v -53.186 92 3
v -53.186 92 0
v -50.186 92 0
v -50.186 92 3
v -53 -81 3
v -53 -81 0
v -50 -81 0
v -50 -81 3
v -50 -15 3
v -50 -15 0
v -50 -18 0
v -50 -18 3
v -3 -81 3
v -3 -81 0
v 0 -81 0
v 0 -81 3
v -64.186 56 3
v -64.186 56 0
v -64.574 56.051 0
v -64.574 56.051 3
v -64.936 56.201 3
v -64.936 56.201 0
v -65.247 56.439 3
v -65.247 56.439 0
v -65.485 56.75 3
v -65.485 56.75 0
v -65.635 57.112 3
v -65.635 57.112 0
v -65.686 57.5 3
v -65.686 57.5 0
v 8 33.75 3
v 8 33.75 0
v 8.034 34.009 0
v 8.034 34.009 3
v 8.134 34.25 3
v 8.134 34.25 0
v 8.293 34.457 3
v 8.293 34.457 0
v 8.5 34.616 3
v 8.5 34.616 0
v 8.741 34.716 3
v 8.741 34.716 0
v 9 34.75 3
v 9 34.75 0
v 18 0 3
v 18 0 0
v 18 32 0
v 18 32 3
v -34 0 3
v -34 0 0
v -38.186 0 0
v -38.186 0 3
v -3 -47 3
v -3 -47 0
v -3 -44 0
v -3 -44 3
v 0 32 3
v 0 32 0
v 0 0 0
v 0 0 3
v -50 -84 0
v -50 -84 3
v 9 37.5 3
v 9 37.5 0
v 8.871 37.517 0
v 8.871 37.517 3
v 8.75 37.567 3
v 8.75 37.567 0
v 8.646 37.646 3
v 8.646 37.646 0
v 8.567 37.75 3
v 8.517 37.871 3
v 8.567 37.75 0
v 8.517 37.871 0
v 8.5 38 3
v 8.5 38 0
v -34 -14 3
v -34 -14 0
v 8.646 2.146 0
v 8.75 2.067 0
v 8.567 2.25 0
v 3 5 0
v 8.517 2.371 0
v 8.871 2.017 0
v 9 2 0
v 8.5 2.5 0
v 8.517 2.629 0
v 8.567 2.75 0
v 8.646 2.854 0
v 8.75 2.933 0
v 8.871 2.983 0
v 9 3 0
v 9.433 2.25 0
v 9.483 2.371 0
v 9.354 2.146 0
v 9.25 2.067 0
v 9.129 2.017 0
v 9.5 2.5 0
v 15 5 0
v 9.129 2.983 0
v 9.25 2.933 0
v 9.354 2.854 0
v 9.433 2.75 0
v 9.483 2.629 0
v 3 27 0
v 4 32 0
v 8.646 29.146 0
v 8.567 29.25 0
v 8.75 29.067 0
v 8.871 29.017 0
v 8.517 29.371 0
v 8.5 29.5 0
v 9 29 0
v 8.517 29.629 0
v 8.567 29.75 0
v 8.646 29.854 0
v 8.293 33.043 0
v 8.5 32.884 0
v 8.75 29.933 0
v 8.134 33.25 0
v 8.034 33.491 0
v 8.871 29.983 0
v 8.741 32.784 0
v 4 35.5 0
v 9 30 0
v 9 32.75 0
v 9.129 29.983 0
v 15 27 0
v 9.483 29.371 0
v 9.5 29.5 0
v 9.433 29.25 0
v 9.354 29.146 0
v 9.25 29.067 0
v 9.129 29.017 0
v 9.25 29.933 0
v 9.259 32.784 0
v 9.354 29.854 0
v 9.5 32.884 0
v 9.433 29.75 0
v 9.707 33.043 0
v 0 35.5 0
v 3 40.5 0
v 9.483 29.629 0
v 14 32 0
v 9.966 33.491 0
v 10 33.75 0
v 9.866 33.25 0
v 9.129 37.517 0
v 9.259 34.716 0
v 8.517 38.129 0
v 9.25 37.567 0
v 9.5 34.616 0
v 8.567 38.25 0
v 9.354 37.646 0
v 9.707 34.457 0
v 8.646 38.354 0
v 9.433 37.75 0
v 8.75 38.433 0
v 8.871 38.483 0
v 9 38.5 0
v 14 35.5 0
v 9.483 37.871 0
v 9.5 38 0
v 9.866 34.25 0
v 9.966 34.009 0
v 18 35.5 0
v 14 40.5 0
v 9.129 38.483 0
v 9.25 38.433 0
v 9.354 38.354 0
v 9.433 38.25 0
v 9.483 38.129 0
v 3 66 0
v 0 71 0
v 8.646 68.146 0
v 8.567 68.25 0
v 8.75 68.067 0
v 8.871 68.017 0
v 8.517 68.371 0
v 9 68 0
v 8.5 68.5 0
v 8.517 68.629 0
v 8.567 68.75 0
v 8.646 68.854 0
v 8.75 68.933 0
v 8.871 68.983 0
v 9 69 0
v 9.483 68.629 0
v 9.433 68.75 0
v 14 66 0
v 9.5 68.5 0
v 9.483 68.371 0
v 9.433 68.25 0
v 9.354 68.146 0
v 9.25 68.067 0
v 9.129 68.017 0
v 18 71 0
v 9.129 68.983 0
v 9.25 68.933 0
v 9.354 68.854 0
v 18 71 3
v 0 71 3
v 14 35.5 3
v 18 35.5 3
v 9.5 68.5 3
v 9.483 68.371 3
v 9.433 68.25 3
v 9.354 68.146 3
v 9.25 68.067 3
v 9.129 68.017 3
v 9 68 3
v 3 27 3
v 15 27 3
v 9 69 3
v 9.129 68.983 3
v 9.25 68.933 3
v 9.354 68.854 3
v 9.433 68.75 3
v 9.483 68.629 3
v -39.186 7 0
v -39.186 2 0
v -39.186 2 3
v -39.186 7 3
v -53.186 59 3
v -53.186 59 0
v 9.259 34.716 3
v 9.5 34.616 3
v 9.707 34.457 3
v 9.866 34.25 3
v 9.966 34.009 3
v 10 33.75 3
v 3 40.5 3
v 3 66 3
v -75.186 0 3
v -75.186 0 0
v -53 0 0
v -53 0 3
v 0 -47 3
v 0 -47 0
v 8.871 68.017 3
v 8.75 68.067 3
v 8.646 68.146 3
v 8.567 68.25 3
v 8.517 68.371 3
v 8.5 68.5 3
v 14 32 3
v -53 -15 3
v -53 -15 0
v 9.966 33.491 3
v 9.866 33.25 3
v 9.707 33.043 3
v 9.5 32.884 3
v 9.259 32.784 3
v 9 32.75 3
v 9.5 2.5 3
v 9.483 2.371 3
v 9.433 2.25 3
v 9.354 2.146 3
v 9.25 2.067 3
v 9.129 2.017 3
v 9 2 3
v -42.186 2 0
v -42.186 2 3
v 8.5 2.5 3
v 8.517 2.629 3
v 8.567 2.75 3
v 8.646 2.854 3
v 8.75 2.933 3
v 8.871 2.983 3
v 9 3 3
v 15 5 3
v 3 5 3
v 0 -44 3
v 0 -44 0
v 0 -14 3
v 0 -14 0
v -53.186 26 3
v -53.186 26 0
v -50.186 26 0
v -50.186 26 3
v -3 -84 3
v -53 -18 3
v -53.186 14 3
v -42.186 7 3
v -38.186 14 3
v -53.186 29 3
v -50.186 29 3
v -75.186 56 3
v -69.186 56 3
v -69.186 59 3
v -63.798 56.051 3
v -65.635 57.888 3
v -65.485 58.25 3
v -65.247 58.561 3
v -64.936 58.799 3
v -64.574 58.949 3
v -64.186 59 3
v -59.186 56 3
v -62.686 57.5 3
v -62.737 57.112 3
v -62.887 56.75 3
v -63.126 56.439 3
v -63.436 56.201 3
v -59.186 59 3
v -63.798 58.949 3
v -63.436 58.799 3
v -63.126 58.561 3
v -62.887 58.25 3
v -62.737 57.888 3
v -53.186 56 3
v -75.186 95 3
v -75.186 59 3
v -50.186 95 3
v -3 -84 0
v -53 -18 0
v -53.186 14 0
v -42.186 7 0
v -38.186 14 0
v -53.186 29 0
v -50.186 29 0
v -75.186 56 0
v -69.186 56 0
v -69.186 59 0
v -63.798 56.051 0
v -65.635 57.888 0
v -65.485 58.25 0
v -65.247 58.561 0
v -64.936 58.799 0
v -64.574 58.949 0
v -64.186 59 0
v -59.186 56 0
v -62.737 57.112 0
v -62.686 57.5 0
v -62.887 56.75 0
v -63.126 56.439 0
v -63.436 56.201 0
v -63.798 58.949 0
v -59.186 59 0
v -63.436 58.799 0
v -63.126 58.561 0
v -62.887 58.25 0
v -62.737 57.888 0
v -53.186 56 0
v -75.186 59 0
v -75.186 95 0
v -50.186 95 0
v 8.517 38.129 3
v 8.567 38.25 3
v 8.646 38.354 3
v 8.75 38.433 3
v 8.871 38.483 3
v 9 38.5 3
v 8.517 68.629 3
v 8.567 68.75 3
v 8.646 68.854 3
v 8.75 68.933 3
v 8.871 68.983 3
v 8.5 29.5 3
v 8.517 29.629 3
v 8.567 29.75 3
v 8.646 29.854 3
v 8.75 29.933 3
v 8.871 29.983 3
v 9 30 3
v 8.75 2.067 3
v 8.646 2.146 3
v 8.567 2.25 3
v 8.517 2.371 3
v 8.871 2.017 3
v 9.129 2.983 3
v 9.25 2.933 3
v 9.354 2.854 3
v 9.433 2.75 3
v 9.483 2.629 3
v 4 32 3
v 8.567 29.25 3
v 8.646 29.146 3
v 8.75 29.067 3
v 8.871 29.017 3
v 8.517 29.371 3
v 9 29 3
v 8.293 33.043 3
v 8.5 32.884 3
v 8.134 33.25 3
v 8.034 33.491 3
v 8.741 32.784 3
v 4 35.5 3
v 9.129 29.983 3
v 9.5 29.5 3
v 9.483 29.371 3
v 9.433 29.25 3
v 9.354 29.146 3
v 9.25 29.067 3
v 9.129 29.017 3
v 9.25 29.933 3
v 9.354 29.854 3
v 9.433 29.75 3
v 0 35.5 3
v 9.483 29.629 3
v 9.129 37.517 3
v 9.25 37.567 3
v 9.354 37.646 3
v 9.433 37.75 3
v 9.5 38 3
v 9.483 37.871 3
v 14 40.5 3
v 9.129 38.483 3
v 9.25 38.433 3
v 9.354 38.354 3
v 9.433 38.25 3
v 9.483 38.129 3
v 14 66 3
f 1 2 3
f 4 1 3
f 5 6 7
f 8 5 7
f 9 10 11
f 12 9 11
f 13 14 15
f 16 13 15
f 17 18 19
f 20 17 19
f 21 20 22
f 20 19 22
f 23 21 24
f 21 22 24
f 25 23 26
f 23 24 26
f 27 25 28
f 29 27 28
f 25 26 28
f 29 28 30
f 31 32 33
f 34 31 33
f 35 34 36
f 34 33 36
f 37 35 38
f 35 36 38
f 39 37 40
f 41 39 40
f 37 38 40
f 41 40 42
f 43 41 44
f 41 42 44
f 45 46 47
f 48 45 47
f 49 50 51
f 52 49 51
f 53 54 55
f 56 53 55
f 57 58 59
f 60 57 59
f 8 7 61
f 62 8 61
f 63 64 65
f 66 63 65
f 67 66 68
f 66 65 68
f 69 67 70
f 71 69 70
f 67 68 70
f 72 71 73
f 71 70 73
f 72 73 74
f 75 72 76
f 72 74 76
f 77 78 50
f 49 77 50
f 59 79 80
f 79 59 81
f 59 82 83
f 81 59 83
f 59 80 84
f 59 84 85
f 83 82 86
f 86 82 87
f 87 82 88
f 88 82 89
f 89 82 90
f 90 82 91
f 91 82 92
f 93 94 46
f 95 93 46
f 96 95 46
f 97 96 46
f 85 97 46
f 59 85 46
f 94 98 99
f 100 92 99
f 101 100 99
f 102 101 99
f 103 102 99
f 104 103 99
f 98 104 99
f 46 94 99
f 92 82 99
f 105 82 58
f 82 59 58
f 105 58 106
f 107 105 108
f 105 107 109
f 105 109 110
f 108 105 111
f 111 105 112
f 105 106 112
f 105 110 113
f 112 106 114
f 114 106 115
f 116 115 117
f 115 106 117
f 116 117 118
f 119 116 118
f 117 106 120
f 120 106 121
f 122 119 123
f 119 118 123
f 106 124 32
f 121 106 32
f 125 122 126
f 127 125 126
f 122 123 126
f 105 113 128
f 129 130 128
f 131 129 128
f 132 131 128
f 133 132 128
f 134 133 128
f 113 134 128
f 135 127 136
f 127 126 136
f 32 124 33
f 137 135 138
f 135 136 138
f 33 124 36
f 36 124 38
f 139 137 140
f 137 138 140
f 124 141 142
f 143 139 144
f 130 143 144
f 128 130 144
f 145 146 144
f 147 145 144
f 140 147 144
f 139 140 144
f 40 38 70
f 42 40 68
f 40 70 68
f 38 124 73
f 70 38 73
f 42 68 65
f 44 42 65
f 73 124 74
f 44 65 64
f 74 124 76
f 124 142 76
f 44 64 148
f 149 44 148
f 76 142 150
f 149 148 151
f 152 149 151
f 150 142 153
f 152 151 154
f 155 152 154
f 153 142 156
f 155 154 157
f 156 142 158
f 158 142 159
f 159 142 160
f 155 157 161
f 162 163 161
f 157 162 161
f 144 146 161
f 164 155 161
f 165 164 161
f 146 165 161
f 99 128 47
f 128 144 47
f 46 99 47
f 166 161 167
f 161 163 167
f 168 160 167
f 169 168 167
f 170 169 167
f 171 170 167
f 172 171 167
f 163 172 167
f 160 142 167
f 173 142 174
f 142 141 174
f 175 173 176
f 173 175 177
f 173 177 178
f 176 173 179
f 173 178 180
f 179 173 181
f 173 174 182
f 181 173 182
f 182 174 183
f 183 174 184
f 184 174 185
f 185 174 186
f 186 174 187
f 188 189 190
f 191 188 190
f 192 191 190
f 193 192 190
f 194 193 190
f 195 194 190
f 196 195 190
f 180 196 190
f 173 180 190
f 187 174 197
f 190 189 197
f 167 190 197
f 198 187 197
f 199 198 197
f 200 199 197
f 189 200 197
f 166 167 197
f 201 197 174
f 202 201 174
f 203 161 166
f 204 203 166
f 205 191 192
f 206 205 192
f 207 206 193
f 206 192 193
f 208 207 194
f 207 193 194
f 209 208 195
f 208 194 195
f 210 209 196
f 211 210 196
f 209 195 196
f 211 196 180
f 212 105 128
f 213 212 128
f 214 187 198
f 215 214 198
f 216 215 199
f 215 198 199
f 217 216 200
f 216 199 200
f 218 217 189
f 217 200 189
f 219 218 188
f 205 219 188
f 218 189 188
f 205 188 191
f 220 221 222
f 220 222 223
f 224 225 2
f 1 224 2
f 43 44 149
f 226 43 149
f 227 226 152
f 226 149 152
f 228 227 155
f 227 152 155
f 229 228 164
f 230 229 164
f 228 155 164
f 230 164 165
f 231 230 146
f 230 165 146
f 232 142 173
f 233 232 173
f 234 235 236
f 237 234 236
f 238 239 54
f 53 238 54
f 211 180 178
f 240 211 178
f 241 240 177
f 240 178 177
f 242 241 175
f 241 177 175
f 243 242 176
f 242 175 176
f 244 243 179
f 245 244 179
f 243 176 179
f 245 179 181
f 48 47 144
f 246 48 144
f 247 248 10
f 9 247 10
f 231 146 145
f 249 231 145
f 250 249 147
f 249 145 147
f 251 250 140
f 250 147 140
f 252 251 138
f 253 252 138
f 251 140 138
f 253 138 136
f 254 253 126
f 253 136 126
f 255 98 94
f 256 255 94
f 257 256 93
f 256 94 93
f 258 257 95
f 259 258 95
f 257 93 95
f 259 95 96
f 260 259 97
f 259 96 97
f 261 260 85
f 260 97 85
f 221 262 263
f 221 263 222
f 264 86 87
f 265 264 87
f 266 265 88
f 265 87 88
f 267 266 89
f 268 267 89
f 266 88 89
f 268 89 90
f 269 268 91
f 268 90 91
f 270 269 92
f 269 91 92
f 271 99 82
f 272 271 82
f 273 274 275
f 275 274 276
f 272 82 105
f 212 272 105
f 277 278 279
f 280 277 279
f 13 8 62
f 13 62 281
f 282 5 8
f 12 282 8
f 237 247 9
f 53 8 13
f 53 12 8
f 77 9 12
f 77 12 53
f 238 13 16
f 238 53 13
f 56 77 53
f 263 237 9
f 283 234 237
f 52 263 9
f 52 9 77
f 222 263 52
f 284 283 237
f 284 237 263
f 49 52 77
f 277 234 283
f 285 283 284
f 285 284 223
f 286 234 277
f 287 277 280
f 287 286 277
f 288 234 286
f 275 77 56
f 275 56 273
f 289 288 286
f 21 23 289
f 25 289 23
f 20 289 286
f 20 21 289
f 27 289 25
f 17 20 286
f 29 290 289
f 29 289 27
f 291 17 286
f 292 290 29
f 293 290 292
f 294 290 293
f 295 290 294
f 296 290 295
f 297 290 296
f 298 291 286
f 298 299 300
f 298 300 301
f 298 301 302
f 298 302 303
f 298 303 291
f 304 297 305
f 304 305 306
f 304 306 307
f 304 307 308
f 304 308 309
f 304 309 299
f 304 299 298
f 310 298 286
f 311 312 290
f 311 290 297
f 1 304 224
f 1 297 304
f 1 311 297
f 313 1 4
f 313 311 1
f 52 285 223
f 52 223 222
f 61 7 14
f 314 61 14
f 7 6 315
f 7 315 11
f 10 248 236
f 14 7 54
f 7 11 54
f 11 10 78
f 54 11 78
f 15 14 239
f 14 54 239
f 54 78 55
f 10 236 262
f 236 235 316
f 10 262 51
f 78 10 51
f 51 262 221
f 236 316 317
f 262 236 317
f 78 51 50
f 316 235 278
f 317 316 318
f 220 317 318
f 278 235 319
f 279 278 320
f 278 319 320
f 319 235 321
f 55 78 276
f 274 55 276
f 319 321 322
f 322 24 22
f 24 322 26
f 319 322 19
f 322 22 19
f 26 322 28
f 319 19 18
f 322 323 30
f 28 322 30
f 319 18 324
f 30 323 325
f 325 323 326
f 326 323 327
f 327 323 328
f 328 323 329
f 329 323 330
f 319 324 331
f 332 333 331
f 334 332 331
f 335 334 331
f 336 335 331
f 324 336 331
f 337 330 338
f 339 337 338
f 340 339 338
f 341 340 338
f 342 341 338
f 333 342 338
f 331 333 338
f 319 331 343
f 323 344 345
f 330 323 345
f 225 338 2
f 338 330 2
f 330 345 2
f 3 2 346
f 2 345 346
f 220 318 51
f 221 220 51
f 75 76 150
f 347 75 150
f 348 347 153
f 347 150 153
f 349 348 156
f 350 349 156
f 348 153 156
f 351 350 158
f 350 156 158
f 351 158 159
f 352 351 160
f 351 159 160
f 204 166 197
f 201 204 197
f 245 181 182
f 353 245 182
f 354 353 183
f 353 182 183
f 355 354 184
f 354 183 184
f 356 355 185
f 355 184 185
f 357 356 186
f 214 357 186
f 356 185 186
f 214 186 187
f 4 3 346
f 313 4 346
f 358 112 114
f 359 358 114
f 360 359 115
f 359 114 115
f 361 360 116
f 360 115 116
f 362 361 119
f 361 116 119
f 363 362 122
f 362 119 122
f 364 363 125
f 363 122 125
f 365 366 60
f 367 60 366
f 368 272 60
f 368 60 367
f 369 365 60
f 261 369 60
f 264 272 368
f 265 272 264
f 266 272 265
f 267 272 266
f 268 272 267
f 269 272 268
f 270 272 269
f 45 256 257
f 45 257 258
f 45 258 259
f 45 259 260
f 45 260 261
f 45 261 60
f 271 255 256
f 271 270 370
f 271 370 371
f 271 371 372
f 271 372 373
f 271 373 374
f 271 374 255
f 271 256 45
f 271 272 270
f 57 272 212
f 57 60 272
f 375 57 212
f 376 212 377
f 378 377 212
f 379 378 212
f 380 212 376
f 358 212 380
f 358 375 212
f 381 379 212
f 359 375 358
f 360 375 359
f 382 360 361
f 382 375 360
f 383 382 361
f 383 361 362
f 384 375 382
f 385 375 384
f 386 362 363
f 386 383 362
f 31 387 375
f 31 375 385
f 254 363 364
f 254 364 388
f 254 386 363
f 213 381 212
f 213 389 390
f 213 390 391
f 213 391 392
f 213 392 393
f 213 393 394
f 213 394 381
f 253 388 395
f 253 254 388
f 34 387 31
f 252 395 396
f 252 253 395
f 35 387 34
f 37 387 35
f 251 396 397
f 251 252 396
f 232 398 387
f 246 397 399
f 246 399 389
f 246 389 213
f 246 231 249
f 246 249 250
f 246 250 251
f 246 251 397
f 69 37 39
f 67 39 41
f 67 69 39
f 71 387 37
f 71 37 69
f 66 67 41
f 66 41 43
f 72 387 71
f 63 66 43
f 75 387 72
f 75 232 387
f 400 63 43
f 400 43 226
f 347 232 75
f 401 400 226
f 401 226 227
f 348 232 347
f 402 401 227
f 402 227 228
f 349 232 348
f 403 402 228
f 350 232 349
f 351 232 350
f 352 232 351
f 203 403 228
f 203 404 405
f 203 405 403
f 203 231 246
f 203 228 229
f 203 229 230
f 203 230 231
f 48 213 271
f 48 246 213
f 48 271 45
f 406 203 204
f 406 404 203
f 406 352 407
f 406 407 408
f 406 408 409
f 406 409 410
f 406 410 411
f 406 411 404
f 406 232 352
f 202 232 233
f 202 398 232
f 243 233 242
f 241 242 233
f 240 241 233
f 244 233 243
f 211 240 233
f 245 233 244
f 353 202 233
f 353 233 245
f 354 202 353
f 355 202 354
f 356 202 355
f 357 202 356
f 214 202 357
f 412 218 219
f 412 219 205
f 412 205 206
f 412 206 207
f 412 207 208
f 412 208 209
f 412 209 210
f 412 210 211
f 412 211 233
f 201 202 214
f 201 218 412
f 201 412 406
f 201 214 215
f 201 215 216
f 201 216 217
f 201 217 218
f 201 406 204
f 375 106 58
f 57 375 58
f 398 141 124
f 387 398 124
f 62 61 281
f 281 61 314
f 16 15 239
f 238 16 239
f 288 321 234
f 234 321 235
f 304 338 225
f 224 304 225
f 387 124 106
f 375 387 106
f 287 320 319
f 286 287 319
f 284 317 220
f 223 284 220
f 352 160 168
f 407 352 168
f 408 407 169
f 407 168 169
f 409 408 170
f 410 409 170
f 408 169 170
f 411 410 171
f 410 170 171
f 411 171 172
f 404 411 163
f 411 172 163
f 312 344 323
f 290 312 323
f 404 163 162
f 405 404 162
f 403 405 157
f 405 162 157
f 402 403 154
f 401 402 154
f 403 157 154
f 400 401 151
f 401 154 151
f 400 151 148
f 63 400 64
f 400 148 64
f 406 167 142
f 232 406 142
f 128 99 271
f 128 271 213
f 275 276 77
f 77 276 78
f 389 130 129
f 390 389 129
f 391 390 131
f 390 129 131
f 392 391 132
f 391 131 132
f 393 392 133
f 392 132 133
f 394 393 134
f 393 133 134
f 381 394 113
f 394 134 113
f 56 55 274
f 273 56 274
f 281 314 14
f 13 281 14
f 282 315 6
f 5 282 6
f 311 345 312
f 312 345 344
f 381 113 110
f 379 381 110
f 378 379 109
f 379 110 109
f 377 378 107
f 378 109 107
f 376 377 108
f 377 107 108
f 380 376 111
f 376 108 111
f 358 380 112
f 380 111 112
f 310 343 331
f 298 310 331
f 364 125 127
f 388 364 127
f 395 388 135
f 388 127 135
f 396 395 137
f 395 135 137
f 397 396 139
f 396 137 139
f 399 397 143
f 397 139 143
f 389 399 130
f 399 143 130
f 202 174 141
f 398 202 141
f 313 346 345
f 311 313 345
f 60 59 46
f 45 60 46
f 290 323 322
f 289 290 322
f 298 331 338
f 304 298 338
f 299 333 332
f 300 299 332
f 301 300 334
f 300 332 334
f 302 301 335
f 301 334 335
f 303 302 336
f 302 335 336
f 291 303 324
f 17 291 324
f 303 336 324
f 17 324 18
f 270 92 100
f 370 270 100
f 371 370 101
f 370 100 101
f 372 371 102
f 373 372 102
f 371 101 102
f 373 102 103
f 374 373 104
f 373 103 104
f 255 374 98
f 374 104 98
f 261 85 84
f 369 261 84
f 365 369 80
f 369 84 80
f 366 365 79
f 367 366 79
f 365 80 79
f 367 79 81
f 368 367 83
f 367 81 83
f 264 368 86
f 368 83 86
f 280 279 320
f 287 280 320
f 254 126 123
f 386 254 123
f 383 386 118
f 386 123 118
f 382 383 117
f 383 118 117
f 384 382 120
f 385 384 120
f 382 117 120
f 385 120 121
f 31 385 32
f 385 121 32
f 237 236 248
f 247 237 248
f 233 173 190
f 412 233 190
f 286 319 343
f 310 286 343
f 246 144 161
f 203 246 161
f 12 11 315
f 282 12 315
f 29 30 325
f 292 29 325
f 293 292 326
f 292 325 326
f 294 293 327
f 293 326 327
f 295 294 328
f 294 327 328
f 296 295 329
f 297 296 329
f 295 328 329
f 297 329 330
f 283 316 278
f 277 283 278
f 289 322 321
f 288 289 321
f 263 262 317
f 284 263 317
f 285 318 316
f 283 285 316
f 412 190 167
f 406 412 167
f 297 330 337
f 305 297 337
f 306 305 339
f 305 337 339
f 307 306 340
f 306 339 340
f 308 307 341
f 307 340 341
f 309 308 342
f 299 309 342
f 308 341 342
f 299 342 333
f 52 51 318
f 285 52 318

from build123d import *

# Parameters (mm, degrees)
F0_W     = 3
F0_H     = 22
F0_W_2   = 4
F0_H_2   = 2.5
F0_H_3   = 25.5
F1_DEPTH = 3
F3_DEPTH = 3
F4_W     = 3
F4_H     = 5
F5_DEPTH = 3


with BuildPart() as f1:
    # F0 (on Top) → F1 (new body)
    with BuildSketch(Plane.XY):
        with BuildLine():
            Line((0, 2.5), (0, 0))
            Line((0, 0), (9, 0))
            Line((9, 0), (9, 2))
            ThreePointArc((9, 2), (8.6464466094, 2.1464466094), (8.5, 2.5))
            Line((8.5, 2.5), (0, 2.5))
        make_face()
        with BuildLine():
            Line((0, 5), (0, 2.5))
            Line((0, 2.5), (8.5, 2.5))
            ThreePointArc((8.5, 2.5), (8.6464466094, 2.8535533906), (9, 3))
            Line((9, 3), (9, 5))
            Line((9, 5), (8.0080386251, 5))
            Line((8.0080386251, 5), (4.5, 5))
            Line((4.5, 5), (3, 5))
            Line((3, 5), (2.25, 5))
            Line((2.25, 5), (0, 5))
        make_face()
        with BuildLine():
            Line((9, 2), (9, 0))
            Line((9, 0), (18, 0))
            Line((18, 0), (18, 2.5))
            Line((18, 2.5), (9.5, 2.5))
            ThreePointArc((9.5, 2.5), (9.3535533906, 2.1464466094), (9, 2))
        make_face()
        Polygon((0, 27), (0, 5), (2.25, 5), (3, 5), (3, 27), align=None)
        with BuildLine():
            Line((0, 29.5), (0, 27))
            Line((0, 27), (3, 27))
            Line((3, 27), (9, 27))
            Line((9, 27), (9, 29))
            ThreePointArc((9, 29), (8.6464466094, 29.1464466094), (8.5, 29.5))
            Line((8.5, 29.5), (0, 29.5))
        make_face()
        with BuildLine():
            Line((9, 5), (9, 3))
            ThreePointArc((9, 3), (9.3535533906, 2.8535533906), (9.5, 2.5))
            Line((9.5, 2.5), (18, 2.5))
            Line((18, 2.5), (18, 5))
            Line((18, 5), (15, 5))
            Line((15, 5), (13.5, 5))
            Line((13.5, 5), (9, 5))
        make_face()
        with BuildLine():
            Line((0, 32), (0, 29.5))
            Line((0, 29.5), (8.5, 29.5))
            ThreePointArc((8.5, 29.5), (8.6464466094, 29.8535533906), (9, 30))
            Line((9, 30), (9, 32))
            Line((9, 32), (4, 32))
            Line((4, 32), (0, 32))
        make_face()
        with Locations((16.5, 16)):
            Rectangle(F0_W, F0_H)
        with BuildLine():
            Line((9, 29), (9, 27))
            Line((9, 27), (15, 27))
            Line((15, 27), (18, 27))
            Line((18, 27), (18, 29.5))
            Line((18, 29.5), (9.5, 29.5))
            ThreePointArc((9.5, 29.5), (9.3535533906, 29.1464466094), (9, 29))
        make_face()
        with BuildLine():
            Line((4, 33.75), (4, 32))
            Line((4, 32), (9, 32))
            Line((9, 32), (9, 32.75))
            ThreePointArc((9, 32.75), (8.2928932188, 33.0428932188), (8, 33.75))
            Line((8, 33.75), (4, 33.75))
        make_face()
        with BuildLine():
            Line((9, 32), (9, 30))
            ThreePointArc((9, 30), (9.3535533906, 29.8535533906), (9.5, 29.5))
            Line((9.5, 29.5), (18, 29.5))
            Line((18, 29.5), (18, 32))
            Line((18, 32), (14, 32))
            Line((14, 32), (9, 32))
        make_face()
        with BuildLine():
            Line((9, 32.75), (9, 32))
            Line((9, 32), (14, 32))
            Line((14, 32), (14, 33.75))
            Line((14, 33.75), (10, 33.75))
            ThreePointArc((10, 33.75), (9.7071067812, 33.0428932188), (9, 32.75))
        make_face()
        with BuildLine():
            Line((4, 35.5), (4, 33.75))
            Line((4, 33.75), (8, 33.75))
            ThreePointArc((8, 33.75), (8.2928932188, 34.4571067812), (9, 34.75))
            Line((9, 34.75), (9, 35.5))
            Line((9, 35.5), (4, 35.5))
        make_face()
        with BuildLine():
            Line((4, 38), (4, 35.5))
            Line((4, 35.5), (9, 35.5))
            Line((9, 35.5), (9, 37.5))
            ThreePointArc((9, 37.5), (8.6464466094, 37.6464466094), (8.5, 38))
            Line((8.5, 38), (4, 38))
        make_face()
        with Locations((2, 36.75)):
            Rectangle(F0_W_2, F0_H_2)
        with BuildLine():
            Line((10, 33.75), (14, 33.75))
            Line((14, 33.75), (14, 35.5))
            Line((14, 35.5), (9, 35.5))
            Line((9, 35.5), (9, 34.75))
            ThreePointArc((9, 34.75), (9.7071067812, 34.4571067812), (10, 33.75))
        make_face()
        with BuildLine():
            Line((9, 37.5), (9, 35.5))
            Line((9, 35.5), (14, 35.5))
            Line((14, 35.5), (18, 35.5))
            Line((18, 35.5), (18, 38))
            Line((18, 38), (9.5, 38))
            ThreePointArc((9.5, 38), (9.3535533906, 37.6464466094), (9, 37.5))
        make_face()
        Polygon((0, 38), (4, 38), (4, 40.5), (3, 40.5), (0, 40.5), align=None)
        with BuildLine():
            ThreePointArc((9, 38.5), (9.3535533906, 38.3535533906), (9.5, 38))
            Line((9.5, 38), (18, 38))
            Line((18, 38), (18, 40.5))
            Line((18, 40.5), (14, 40.5))
            Line((14, 40.5), (9, 40.5))
            Line((9, 40.5), (9, 38.5))
        make_face()
        with Locations((1.5, 53.25)):
            Rectangle(F0_W, F0_H_3)
        Polygon((0, 71), (0, 66), (3, 66), (3, 68.5), (3, 71), align=None)
        with Locations((16, 53.25)):
            Rectangle(F0_W_2, F0_H_3)
        Polygon((14, 68.5), (14, 66), (18, 66), (18, 71), (14, 71), align=None)
        with BuildLine():
            Line((3, 71), (3, 68.5))
            Line((3, 68.5), (8.5, 68.5))
            ThreePointArc((8.5, 68.5), (8.6464466094, 68.8535533906), (9, 69))
            Line((9, 69), (9, 71))
            Line((9, 71), (3, 71))
        make_face()
        with BuildLine():
            Line((9.5, 68.5), (14, 68.5))
            Line((14, 68.5), (14, 71))
            Line((14, 71), (9, 71))
            Line((9, 71), (9, 69))
            ThreePointArc((9, 69), (9.3535533906, 68.8535533906), (9.5, 68.5))
        make_face()
        with BuildLine():
            Line((4, 40.5), (4, 38))
            Line((4, 38), (8.5, 38))
            ThreePointArc((8.5, 38), (8.6464466094, 38.3535533906), (9, 38.5))
            Line((9, 38.5), (9, 40.5))
            Line((9, 40.5), (4, 40.5))
        make_face()
        with BuildLine():
            Line((3, 68.5), (3, 66))
            Line((3, 66), (9, 66))
            Line((9, 66), (9, 68))
            ThreePointArc((9, 68), (8.6464466094, 68.1464466094), (8.5, 68.5))
            Line((8.5, 68.5), (3, 68.5))
        make_face()
        with BuildLine():
            Line((9, 66), (14, 66))
            Line((14, 66), (14, 68.5))
            Line((14, 68.5), (9.5, 68.5))
            ThreePointArc((9.5, 68.5), (9.3535533906, 68.1464466094), (9, 68))
            Line((9, 68), (9, 66))
        make_face()
    extrude(amount=F1_DEPTH)


with BuildPart() as f3:
    # F2 (on Top) → F3 (new body)
    with BuildSketch(Plane.XY):
        Polygon((-34, 0), (-53, 0), (-53, -15), (-50, -15), (-50, -18), (-53, -18), (-53, -81), (-50, -81), (-50, -84), (-3, -84), (-3, -81), (0, -81), (0, -47), (-3, -47), (-3, -44), (0, -44), (0, -14), (-34, -14), align=None)
    extrude(amount=F3_DEPTH)

    # F4 (on Top) → F5 (join)
    with BuildSketch(Plane.XY):
        Polygon((-75.1862302423, 56), (-75.1862302423, 0), (-38.1862302423, 0), (-38.1862302423, 14), (-50.1862302423, 14), (-53.1862302423, 14), (-53.1862302423, 26), (-50.1862302423, 26), (-50.1862302423, 29), (-53.1862302423, 29), (-53.1862302423, 56), (-59.1862302423, 56), (-64.1862302423, 56), (-69.1862302423, 56), align=None)
        with Locations((-40.6862302423, 4.5)):
            Rectangle(F4_W, F4_H, mode=Mode.SUBTRACT)
        with BuildLine():
            Line((-69.1862302423, 57.5), (-69.1862302423, 56))
            Line((-69.1862302423, 56), (-64.1862302423, 56))
            ThreePointArc((-64.1862302423, 56), (-65.246890414, 56.4393398282), (-65.6862302423, 57.5))
            Line((-65.6862302423, 57.5), (-69.1862302423, 57.5))
        make_face()
        with BuildLine():
            Line((-69.1862302423, 59), (-69.1862302423, 57.5))
            Line((-69.1862302423, 57.5), (-65.6862302423, 57.5))
            ThreePointArc((-65.6862302423, 57.5), (-65.246890414, 58.5606601718), (-64.1862302423, 59))
            Line((-64.1862302423, 59), (-69.1862302423, 59))
        make_face()
        with BuildLine():
            ThreePointArc((-62.6862302423, 57.5), (-63.1255700705, 56.4393398282), (-64.1862302423, 56))
            Line((-64.1862302423, 56), (-59.1862302423, 56))
            Line((-59.1862302423, 56), (-59.1862302423, 57.5))
            Line((-59.1862302423, 57.5), (-62.6862302423, 57.5))
        make_face()
        Polygon((-75.1862302423, 59), (-69.1862302423, 59), (-64.1862302423, 59), (-59.1862302423, 59), (-53.1862302423, 59), (-53.1862302423, 92), (-50.1862302423, 92), (-50.1862302423, 95), (-75.1862302423, 95), align=None)
        with BuildLine():
            ThreePointArc((-64.1862302423, 59), (-63.1255700705, 58.5606601718), (-62.6862302423, 57.5))
            Line((-62.6862302423, 57.5), (-59.1862302423, 57.5))
            Line((-59.1862302423, 57.5), (-59.1862302423, 59))
            Line((-59.1862302423, 59), (-64.1862302423, 59))
        make_face()
    extrude(amount=F5_DEPTH)


solid = Compound([f1.part, f3.part])
